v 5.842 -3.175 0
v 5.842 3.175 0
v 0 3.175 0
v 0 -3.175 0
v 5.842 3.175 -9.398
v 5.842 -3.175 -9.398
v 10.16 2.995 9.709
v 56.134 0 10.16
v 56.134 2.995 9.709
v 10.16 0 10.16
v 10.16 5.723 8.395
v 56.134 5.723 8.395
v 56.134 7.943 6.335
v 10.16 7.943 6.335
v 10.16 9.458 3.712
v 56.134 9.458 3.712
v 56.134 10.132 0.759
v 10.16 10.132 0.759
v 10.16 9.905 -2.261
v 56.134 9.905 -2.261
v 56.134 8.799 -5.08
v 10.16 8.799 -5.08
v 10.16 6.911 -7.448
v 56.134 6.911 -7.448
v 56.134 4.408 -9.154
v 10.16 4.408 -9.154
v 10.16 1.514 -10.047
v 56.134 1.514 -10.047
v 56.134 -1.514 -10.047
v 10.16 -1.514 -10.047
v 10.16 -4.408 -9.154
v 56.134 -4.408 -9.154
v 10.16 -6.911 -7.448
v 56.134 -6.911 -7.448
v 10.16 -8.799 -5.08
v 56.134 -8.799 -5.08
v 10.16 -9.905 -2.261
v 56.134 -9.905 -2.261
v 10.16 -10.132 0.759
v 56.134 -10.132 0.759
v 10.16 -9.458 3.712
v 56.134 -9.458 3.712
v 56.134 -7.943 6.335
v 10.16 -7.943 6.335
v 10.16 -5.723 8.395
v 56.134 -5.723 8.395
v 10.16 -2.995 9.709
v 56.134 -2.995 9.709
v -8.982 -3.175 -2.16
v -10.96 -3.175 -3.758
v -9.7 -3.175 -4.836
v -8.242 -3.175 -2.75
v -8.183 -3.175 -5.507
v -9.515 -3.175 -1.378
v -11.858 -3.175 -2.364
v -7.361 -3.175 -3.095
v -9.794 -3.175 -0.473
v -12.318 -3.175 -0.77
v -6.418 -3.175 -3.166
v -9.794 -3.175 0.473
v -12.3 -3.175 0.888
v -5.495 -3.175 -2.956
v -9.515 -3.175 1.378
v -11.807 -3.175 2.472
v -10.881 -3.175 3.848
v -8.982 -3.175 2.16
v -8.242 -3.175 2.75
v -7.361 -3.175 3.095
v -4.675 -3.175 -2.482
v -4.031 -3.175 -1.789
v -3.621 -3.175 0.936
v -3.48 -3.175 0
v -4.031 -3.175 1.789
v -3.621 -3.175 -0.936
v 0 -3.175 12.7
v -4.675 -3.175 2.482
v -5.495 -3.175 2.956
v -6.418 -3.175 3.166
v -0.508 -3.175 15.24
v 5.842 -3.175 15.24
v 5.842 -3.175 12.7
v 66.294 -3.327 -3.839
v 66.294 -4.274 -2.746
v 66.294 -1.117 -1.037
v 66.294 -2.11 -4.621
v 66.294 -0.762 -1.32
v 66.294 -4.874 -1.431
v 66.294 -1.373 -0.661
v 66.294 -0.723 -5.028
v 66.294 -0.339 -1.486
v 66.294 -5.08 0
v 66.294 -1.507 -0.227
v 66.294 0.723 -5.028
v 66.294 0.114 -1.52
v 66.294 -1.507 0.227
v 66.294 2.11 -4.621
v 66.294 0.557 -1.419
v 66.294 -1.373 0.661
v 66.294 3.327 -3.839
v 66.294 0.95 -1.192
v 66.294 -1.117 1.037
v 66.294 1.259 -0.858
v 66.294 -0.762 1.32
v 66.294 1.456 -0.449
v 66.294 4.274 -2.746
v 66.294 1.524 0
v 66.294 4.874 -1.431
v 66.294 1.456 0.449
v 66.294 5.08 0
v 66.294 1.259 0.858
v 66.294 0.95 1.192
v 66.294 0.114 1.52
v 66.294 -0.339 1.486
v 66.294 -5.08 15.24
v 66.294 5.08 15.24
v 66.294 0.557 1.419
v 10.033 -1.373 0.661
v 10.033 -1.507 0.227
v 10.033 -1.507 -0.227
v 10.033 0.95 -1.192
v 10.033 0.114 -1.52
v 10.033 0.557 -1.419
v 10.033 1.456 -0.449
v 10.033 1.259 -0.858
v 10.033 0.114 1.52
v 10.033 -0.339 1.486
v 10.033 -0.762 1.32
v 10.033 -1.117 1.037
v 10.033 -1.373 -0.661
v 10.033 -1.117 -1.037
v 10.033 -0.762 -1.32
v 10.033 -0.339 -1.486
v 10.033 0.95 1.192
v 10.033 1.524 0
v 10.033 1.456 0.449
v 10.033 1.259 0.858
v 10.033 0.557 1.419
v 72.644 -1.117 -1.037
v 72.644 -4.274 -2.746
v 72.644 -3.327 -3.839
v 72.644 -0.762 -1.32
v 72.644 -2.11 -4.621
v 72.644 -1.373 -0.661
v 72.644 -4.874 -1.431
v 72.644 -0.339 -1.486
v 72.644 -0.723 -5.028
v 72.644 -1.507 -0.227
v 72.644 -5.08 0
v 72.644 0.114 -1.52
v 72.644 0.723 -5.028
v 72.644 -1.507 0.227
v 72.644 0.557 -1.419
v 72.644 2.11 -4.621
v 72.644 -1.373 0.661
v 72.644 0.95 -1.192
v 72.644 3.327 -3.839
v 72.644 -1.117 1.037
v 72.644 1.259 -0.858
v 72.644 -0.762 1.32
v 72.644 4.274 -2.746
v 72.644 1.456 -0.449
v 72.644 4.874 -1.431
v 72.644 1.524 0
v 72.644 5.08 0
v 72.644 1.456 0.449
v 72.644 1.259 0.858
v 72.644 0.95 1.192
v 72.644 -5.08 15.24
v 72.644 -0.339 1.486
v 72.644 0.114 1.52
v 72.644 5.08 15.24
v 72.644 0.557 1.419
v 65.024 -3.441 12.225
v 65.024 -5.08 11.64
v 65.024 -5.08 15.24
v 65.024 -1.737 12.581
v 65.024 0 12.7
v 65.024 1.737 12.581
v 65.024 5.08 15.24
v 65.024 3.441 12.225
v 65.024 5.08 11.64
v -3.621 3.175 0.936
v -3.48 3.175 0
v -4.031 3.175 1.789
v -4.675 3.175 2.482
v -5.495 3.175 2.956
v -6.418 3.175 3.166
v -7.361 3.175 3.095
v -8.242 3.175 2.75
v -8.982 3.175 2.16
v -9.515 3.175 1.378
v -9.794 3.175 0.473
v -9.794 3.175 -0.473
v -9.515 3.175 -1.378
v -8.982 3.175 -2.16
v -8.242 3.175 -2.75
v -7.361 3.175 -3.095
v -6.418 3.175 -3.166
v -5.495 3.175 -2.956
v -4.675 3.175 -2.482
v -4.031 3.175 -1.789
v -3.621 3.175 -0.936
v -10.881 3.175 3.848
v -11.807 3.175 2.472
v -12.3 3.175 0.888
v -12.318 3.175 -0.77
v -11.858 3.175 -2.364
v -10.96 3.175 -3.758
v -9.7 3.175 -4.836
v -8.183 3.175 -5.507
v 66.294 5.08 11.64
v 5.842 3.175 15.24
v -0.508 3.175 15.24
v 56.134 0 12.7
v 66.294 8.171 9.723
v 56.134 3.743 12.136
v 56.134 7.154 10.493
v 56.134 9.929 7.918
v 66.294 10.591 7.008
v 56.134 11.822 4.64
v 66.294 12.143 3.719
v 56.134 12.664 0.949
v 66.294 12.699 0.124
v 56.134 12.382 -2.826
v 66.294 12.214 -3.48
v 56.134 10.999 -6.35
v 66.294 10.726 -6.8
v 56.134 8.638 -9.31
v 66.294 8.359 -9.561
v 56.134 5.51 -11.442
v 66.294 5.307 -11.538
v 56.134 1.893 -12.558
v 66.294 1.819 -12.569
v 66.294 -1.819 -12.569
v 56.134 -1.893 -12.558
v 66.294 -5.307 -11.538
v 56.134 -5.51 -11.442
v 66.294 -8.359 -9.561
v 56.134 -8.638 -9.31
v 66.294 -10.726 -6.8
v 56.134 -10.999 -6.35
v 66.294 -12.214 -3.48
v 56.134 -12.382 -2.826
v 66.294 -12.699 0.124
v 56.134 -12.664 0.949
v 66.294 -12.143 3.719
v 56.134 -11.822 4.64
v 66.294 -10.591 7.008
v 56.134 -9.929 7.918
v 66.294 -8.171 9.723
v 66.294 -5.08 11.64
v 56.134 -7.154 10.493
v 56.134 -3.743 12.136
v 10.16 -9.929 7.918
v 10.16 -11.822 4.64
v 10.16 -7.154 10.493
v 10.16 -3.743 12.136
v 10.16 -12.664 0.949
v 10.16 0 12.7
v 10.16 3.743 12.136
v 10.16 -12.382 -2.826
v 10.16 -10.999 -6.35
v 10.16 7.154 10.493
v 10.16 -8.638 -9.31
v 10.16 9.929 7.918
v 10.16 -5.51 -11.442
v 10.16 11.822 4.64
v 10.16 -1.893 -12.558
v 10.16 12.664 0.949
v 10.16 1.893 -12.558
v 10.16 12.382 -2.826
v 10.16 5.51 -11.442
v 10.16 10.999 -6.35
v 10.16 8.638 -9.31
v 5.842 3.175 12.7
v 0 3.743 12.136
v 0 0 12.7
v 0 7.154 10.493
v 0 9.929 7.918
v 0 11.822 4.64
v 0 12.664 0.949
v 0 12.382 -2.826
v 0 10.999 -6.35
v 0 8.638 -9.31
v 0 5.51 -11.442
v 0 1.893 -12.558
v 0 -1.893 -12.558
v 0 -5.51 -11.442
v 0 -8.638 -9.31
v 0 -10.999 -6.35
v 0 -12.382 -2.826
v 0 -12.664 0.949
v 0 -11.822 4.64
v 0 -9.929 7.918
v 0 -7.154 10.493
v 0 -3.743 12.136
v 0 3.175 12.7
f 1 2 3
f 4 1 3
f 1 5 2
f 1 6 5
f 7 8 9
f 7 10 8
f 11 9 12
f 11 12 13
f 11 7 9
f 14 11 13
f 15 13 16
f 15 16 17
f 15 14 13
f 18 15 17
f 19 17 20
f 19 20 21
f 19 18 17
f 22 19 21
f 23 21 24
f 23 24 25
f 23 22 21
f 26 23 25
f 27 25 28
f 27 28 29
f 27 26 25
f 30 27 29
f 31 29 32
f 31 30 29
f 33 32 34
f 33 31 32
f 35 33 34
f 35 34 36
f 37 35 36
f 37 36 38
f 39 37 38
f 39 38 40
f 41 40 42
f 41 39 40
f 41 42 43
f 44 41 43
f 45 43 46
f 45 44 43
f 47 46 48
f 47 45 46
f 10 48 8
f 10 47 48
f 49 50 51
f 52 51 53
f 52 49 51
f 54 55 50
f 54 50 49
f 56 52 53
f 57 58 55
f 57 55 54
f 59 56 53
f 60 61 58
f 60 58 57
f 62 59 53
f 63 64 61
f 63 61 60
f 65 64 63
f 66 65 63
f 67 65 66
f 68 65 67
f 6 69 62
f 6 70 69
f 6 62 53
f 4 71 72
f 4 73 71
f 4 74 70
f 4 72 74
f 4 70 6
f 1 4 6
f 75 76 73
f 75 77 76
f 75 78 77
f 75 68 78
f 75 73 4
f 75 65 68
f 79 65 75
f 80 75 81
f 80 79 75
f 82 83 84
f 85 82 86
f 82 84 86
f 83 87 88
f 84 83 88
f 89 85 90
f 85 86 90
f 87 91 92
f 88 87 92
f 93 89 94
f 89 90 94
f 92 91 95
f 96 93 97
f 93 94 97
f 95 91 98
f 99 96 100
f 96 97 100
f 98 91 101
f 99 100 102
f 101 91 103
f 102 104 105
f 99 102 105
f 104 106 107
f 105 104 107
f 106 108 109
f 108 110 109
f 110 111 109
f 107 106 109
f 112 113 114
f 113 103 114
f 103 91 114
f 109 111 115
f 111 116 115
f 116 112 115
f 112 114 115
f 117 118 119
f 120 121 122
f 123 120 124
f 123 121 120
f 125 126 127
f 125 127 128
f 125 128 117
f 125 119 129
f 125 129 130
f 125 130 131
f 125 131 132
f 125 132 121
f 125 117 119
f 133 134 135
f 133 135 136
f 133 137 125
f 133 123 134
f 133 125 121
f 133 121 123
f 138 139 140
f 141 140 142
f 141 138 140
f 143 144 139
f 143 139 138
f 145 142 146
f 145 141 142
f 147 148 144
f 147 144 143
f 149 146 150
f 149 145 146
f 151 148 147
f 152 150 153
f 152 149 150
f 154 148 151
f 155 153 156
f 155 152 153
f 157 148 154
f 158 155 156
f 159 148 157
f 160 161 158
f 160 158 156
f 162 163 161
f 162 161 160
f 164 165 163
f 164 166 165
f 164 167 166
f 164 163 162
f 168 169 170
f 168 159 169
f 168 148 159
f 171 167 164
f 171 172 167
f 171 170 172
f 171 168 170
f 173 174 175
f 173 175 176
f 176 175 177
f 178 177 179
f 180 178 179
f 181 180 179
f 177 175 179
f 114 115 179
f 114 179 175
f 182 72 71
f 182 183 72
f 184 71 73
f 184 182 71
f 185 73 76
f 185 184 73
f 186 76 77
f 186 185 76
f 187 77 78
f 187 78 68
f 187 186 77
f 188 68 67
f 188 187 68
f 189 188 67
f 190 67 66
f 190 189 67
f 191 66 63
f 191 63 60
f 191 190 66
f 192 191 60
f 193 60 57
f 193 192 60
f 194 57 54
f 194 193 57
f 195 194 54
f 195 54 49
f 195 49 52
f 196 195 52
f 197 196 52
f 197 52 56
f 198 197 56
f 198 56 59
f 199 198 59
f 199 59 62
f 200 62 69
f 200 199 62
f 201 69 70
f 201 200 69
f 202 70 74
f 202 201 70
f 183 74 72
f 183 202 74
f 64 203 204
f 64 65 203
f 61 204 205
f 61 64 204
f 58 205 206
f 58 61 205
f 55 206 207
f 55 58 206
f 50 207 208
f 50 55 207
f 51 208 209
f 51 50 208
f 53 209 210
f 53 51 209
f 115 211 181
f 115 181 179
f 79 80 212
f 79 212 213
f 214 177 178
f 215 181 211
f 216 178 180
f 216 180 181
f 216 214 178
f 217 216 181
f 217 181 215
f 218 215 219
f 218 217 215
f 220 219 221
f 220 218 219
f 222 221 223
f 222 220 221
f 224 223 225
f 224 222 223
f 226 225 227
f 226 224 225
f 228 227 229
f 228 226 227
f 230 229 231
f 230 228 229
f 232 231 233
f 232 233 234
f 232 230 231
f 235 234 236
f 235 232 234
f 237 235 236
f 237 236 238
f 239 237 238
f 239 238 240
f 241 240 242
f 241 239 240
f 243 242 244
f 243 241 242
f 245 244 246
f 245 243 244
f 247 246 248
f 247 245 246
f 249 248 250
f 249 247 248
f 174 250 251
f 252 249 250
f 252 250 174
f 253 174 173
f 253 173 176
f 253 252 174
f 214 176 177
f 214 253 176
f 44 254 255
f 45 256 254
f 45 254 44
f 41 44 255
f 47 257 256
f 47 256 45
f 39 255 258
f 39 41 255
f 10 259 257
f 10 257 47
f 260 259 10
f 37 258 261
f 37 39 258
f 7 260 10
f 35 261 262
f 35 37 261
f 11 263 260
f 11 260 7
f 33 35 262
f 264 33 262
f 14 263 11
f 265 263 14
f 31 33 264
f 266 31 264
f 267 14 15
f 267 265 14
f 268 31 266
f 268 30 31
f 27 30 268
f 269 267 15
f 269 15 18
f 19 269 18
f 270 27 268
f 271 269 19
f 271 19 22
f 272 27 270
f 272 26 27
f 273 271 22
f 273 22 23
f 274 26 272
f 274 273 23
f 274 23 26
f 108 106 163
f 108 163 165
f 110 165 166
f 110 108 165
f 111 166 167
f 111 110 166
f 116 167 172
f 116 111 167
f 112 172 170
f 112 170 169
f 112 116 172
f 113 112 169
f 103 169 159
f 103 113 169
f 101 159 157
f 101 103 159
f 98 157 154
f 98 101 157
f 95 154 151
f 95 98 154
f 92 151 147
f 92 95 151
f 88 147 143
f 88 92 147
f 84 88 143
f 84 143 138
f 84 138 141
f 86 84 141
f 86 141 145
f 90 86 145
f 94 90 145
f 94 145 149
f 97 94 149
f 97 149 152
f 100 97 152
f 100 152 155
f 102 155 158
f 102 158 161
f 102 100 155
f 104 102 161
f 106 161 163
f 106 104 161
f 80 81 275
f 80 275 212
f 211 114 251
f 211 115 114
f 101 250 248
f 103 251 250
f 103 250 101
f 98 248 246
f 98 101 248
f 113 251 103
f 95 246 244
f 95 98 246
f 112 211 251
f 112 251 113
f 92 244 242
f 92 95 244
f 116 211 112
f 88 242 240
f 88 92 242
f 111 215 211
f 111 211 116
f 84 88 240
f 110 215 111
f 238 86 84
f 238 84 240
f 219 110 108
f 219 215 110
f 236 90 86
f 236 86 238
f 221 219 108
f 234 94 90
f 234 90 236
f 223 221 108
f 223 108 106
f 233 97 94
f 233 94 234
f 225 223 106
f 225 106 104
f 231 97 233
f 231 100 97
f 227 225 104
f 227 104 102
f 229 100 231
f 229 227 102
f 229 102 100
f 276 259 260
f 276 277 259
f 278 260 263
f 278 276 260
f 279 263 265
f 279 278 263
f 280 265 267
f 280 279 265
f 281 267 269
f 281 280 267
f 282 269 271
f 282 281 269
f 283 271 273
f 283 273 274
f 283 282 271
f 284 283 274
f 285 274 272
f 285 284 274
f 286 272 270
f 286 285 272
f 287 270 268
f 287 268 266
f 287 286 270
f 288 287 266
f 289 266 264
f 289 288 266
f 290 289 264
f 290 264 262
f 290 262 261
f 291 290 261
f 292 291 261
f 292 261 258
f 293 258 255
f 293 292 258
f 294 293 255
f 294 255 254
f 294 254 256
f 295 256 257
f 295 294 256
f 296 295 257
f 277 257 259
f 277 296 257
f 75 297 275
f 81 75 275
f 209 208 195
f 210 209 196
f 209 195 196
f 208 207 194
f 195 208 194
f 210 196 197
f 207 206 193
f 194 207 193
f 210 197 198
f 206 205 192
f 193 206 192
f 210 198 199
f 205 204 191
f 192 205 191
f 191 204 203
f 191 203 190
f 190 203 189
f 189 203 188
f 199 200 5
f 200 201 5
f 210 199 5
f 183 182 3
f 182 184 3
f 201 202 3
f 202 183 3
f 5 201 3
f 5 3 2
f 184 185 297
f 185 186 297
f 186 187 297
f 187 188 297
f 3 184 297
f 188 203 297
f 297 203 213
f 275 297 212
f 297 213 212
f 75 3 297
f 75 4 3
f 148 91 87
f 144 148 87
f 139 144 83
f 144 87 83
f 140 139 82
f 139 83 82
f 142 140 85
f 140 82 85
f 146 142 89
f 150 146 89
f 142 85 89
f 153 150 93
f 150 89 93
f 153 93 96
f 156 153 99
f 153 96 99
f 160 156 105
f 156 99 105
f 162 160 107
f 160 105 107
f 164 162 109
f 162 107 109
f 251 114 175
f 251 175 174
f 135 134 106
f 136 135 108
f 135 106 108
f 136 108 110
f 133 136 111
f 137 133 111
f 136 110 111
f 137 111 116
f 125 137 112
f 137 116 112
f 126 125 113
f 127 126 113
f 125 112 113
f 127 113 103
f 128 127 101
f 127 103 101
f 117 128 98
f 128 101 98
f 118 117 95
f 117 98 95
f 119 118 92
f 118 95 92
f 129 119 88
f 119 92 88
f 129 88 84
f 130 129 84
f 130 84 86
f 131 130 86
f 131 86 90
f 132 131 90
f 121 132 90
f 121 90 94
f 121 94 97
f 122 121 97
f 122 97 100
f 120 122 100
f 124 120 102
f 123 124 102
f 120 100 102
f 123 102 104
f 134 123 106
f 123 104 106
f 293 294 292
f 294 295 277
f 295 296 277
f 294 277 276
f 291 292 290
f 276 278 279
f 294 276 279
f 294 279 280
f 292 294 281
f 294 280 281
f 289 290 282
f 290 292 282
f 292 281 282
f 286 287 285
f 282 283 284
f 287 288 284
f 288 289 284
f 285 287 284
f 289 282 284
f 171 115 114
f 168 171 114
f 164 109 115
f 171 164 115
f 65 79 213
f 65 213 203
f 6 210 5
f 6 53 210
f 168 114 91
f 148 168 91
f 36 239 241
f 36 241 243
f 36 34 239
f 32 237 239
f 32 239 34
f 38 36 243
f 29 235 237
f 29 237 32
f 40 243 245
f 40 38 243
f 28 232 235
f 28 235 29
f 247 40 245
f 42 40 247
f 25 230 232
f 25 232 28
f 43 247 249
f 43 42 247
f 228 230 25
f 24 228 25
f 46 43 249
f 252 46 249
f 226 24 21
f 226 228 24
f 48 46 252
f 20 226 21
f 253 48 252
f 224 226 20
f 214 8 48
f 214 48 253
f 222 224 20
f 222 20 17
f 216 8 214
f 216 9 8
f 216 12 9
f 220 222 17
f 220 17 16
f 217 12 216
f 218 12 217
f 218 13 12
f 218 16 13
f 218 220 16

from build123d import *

# Parameters (mm, degrees)
F0_W     = 5.842
F0_H     = 12.7
F0_R     = 3.175
F2_DEPTH = 3.175
F3_R     = 1.524
F4_DEPTH = 1.27
F5_DEPTH = 6.35
F6_DEPTH = 56.261


with BuildPart() as f1:
    # F0 (on Front) → F1 (revolve)
    with BuildSketch(Plane.XZ):
        Polygon((5.842, 12.7), (5.842, 0), (66.294, 0), (66.294, 12.7), (56.134, 12.7), (56.134, 10.16), (10.16, 10.16), (10.16, 12.7), align=None)
        with Locations((2.921, 6.35)):
            Rectangle(F0_W, F0_H)
    revolve(axis=Axis((33.147, 0, 0), (-1, 0, 0)))

    # F3 (on face) → F4 (join)
    with BuildSketch(Plane.YZ.offset(66.294)):
        with BuildLine():
            Line((-5.08, 11.639742), (-5.08, 0))
            ThreePointArc((-5.08, 0), (0, -5.08), (5.08, 0))
            Line((5.08, 0), (5.08, 11.639742))
            ThreePointArc((5.08, 11.639742), (0, 12.7), (-5.08, 11.639742))
        make_face()
        Circle(F3_R, mode=Mode.SUBTRACT)
        Circle(F3_R)
        with BuildLine():
            Line((-5.08, 15.24), (-5.08, 11.639742))
            ThreePointArc((-5.08, 11.639742), (0, 12.7), (5.08, 11.639742))
            Line((5.08, 11.639742), (5.08, 15.24))
            Line((5.08, 15.24), (-5.08, 15.24))
        make_face()
    extrude(amount=-F4_DEPTH)

    # F3 (on face) → F6 (cut)
    with BuildSketch(Plane.YZ.offset(66.294)):
        Circle(F3_R)
    extrude(amount=-F6_DEPTH, mode=Mode.SUBTRACT)


with BuildPart() as f2:
    # F0 (on Front) → F2 (new body, symmetric)
    with BuildSketch(Plane.XZ):
        with BuildLine():
            Line((-0.9398, 0), (0, 0))
            Line((0, 0), (0, 12.7))
            Line((0, 12.7), (5.842, 12.7))
            Line((5.842, 12.7), (5.842, 15.24))
            Line((5.842, 15.24), (-0.508, 15.24))
            Line((-0.508, 15.24), (-10.88063, 3.847543))
            ThreePointArc((-10.88063, 3.847543), (-4.591961, 5.329721), (-0.9398, 0))
        make_face()
        with BuildLine():
            Line((5.842, 0), (0, 0))
            Line((0, 0), (-0.9398, 0))
            ThreePointArc((-0.9398, 0), (-3.195791, -4.549339), (-8.182663, -5.506983))
            Line((-8.182663, -5.506983), (5.842, -9.398))
            Line((5.842, -9.398), (5.842, 0))
        make_face()
        with BuildLine():
            ThreePointArc((-8.182663, -5.506983), (-3.195791, -4.549339), (-0.9398, 0))
            ThreePointArc((-0.9398, 0), (-4.591961, 5.329721), (-10.88063, 3.847543))
            ThreePointArc((-10.88063, 3.847543), (-12.145978, -1.583727), (-8.182663, -5.506983))
        make_face()
        with Locations((-6.6548, 0)):
            Circle(F0_R, mode=Mode.SUBTRACT)
    extrude(amount=F2_DEPTH, both=True)


with BuildPart() as f5:
    # F3 (on face) → F5 (new body)
    with BuildSketch(Plane.YZ.offset(66.294)):
        with BuildLine():
            Line((-5.08, 15.24), (-5.08, 11.639742))
            ThreePointArc((-5.08, 11.639742), (0, 12.7), (5.08, 11.639742))
            Line((5.08, 11.639742), (5.08, 15.24))
            Line((5.08, 15.24), (-5.08, 15.24))
        make_face()
        with BuildLine():
            Line((-5.08, 11.639742), (-5.08, 0))
            ThreePointArc((-5.08, 0), (0, -5.08), (5.08, 0))
            Line((5.08, 0), (5.08, 11.639742))
            ThreePointArc((5.08, 11.639742), (0, 12.7), (-5.08, 11.639742))
        make_face()
        Circle(F3_R, mode=Mode.SUBTRACT)
    extrude(amount=F5_DEPTH)


solid = Compound([f1.part, f2.part, f5.part])
